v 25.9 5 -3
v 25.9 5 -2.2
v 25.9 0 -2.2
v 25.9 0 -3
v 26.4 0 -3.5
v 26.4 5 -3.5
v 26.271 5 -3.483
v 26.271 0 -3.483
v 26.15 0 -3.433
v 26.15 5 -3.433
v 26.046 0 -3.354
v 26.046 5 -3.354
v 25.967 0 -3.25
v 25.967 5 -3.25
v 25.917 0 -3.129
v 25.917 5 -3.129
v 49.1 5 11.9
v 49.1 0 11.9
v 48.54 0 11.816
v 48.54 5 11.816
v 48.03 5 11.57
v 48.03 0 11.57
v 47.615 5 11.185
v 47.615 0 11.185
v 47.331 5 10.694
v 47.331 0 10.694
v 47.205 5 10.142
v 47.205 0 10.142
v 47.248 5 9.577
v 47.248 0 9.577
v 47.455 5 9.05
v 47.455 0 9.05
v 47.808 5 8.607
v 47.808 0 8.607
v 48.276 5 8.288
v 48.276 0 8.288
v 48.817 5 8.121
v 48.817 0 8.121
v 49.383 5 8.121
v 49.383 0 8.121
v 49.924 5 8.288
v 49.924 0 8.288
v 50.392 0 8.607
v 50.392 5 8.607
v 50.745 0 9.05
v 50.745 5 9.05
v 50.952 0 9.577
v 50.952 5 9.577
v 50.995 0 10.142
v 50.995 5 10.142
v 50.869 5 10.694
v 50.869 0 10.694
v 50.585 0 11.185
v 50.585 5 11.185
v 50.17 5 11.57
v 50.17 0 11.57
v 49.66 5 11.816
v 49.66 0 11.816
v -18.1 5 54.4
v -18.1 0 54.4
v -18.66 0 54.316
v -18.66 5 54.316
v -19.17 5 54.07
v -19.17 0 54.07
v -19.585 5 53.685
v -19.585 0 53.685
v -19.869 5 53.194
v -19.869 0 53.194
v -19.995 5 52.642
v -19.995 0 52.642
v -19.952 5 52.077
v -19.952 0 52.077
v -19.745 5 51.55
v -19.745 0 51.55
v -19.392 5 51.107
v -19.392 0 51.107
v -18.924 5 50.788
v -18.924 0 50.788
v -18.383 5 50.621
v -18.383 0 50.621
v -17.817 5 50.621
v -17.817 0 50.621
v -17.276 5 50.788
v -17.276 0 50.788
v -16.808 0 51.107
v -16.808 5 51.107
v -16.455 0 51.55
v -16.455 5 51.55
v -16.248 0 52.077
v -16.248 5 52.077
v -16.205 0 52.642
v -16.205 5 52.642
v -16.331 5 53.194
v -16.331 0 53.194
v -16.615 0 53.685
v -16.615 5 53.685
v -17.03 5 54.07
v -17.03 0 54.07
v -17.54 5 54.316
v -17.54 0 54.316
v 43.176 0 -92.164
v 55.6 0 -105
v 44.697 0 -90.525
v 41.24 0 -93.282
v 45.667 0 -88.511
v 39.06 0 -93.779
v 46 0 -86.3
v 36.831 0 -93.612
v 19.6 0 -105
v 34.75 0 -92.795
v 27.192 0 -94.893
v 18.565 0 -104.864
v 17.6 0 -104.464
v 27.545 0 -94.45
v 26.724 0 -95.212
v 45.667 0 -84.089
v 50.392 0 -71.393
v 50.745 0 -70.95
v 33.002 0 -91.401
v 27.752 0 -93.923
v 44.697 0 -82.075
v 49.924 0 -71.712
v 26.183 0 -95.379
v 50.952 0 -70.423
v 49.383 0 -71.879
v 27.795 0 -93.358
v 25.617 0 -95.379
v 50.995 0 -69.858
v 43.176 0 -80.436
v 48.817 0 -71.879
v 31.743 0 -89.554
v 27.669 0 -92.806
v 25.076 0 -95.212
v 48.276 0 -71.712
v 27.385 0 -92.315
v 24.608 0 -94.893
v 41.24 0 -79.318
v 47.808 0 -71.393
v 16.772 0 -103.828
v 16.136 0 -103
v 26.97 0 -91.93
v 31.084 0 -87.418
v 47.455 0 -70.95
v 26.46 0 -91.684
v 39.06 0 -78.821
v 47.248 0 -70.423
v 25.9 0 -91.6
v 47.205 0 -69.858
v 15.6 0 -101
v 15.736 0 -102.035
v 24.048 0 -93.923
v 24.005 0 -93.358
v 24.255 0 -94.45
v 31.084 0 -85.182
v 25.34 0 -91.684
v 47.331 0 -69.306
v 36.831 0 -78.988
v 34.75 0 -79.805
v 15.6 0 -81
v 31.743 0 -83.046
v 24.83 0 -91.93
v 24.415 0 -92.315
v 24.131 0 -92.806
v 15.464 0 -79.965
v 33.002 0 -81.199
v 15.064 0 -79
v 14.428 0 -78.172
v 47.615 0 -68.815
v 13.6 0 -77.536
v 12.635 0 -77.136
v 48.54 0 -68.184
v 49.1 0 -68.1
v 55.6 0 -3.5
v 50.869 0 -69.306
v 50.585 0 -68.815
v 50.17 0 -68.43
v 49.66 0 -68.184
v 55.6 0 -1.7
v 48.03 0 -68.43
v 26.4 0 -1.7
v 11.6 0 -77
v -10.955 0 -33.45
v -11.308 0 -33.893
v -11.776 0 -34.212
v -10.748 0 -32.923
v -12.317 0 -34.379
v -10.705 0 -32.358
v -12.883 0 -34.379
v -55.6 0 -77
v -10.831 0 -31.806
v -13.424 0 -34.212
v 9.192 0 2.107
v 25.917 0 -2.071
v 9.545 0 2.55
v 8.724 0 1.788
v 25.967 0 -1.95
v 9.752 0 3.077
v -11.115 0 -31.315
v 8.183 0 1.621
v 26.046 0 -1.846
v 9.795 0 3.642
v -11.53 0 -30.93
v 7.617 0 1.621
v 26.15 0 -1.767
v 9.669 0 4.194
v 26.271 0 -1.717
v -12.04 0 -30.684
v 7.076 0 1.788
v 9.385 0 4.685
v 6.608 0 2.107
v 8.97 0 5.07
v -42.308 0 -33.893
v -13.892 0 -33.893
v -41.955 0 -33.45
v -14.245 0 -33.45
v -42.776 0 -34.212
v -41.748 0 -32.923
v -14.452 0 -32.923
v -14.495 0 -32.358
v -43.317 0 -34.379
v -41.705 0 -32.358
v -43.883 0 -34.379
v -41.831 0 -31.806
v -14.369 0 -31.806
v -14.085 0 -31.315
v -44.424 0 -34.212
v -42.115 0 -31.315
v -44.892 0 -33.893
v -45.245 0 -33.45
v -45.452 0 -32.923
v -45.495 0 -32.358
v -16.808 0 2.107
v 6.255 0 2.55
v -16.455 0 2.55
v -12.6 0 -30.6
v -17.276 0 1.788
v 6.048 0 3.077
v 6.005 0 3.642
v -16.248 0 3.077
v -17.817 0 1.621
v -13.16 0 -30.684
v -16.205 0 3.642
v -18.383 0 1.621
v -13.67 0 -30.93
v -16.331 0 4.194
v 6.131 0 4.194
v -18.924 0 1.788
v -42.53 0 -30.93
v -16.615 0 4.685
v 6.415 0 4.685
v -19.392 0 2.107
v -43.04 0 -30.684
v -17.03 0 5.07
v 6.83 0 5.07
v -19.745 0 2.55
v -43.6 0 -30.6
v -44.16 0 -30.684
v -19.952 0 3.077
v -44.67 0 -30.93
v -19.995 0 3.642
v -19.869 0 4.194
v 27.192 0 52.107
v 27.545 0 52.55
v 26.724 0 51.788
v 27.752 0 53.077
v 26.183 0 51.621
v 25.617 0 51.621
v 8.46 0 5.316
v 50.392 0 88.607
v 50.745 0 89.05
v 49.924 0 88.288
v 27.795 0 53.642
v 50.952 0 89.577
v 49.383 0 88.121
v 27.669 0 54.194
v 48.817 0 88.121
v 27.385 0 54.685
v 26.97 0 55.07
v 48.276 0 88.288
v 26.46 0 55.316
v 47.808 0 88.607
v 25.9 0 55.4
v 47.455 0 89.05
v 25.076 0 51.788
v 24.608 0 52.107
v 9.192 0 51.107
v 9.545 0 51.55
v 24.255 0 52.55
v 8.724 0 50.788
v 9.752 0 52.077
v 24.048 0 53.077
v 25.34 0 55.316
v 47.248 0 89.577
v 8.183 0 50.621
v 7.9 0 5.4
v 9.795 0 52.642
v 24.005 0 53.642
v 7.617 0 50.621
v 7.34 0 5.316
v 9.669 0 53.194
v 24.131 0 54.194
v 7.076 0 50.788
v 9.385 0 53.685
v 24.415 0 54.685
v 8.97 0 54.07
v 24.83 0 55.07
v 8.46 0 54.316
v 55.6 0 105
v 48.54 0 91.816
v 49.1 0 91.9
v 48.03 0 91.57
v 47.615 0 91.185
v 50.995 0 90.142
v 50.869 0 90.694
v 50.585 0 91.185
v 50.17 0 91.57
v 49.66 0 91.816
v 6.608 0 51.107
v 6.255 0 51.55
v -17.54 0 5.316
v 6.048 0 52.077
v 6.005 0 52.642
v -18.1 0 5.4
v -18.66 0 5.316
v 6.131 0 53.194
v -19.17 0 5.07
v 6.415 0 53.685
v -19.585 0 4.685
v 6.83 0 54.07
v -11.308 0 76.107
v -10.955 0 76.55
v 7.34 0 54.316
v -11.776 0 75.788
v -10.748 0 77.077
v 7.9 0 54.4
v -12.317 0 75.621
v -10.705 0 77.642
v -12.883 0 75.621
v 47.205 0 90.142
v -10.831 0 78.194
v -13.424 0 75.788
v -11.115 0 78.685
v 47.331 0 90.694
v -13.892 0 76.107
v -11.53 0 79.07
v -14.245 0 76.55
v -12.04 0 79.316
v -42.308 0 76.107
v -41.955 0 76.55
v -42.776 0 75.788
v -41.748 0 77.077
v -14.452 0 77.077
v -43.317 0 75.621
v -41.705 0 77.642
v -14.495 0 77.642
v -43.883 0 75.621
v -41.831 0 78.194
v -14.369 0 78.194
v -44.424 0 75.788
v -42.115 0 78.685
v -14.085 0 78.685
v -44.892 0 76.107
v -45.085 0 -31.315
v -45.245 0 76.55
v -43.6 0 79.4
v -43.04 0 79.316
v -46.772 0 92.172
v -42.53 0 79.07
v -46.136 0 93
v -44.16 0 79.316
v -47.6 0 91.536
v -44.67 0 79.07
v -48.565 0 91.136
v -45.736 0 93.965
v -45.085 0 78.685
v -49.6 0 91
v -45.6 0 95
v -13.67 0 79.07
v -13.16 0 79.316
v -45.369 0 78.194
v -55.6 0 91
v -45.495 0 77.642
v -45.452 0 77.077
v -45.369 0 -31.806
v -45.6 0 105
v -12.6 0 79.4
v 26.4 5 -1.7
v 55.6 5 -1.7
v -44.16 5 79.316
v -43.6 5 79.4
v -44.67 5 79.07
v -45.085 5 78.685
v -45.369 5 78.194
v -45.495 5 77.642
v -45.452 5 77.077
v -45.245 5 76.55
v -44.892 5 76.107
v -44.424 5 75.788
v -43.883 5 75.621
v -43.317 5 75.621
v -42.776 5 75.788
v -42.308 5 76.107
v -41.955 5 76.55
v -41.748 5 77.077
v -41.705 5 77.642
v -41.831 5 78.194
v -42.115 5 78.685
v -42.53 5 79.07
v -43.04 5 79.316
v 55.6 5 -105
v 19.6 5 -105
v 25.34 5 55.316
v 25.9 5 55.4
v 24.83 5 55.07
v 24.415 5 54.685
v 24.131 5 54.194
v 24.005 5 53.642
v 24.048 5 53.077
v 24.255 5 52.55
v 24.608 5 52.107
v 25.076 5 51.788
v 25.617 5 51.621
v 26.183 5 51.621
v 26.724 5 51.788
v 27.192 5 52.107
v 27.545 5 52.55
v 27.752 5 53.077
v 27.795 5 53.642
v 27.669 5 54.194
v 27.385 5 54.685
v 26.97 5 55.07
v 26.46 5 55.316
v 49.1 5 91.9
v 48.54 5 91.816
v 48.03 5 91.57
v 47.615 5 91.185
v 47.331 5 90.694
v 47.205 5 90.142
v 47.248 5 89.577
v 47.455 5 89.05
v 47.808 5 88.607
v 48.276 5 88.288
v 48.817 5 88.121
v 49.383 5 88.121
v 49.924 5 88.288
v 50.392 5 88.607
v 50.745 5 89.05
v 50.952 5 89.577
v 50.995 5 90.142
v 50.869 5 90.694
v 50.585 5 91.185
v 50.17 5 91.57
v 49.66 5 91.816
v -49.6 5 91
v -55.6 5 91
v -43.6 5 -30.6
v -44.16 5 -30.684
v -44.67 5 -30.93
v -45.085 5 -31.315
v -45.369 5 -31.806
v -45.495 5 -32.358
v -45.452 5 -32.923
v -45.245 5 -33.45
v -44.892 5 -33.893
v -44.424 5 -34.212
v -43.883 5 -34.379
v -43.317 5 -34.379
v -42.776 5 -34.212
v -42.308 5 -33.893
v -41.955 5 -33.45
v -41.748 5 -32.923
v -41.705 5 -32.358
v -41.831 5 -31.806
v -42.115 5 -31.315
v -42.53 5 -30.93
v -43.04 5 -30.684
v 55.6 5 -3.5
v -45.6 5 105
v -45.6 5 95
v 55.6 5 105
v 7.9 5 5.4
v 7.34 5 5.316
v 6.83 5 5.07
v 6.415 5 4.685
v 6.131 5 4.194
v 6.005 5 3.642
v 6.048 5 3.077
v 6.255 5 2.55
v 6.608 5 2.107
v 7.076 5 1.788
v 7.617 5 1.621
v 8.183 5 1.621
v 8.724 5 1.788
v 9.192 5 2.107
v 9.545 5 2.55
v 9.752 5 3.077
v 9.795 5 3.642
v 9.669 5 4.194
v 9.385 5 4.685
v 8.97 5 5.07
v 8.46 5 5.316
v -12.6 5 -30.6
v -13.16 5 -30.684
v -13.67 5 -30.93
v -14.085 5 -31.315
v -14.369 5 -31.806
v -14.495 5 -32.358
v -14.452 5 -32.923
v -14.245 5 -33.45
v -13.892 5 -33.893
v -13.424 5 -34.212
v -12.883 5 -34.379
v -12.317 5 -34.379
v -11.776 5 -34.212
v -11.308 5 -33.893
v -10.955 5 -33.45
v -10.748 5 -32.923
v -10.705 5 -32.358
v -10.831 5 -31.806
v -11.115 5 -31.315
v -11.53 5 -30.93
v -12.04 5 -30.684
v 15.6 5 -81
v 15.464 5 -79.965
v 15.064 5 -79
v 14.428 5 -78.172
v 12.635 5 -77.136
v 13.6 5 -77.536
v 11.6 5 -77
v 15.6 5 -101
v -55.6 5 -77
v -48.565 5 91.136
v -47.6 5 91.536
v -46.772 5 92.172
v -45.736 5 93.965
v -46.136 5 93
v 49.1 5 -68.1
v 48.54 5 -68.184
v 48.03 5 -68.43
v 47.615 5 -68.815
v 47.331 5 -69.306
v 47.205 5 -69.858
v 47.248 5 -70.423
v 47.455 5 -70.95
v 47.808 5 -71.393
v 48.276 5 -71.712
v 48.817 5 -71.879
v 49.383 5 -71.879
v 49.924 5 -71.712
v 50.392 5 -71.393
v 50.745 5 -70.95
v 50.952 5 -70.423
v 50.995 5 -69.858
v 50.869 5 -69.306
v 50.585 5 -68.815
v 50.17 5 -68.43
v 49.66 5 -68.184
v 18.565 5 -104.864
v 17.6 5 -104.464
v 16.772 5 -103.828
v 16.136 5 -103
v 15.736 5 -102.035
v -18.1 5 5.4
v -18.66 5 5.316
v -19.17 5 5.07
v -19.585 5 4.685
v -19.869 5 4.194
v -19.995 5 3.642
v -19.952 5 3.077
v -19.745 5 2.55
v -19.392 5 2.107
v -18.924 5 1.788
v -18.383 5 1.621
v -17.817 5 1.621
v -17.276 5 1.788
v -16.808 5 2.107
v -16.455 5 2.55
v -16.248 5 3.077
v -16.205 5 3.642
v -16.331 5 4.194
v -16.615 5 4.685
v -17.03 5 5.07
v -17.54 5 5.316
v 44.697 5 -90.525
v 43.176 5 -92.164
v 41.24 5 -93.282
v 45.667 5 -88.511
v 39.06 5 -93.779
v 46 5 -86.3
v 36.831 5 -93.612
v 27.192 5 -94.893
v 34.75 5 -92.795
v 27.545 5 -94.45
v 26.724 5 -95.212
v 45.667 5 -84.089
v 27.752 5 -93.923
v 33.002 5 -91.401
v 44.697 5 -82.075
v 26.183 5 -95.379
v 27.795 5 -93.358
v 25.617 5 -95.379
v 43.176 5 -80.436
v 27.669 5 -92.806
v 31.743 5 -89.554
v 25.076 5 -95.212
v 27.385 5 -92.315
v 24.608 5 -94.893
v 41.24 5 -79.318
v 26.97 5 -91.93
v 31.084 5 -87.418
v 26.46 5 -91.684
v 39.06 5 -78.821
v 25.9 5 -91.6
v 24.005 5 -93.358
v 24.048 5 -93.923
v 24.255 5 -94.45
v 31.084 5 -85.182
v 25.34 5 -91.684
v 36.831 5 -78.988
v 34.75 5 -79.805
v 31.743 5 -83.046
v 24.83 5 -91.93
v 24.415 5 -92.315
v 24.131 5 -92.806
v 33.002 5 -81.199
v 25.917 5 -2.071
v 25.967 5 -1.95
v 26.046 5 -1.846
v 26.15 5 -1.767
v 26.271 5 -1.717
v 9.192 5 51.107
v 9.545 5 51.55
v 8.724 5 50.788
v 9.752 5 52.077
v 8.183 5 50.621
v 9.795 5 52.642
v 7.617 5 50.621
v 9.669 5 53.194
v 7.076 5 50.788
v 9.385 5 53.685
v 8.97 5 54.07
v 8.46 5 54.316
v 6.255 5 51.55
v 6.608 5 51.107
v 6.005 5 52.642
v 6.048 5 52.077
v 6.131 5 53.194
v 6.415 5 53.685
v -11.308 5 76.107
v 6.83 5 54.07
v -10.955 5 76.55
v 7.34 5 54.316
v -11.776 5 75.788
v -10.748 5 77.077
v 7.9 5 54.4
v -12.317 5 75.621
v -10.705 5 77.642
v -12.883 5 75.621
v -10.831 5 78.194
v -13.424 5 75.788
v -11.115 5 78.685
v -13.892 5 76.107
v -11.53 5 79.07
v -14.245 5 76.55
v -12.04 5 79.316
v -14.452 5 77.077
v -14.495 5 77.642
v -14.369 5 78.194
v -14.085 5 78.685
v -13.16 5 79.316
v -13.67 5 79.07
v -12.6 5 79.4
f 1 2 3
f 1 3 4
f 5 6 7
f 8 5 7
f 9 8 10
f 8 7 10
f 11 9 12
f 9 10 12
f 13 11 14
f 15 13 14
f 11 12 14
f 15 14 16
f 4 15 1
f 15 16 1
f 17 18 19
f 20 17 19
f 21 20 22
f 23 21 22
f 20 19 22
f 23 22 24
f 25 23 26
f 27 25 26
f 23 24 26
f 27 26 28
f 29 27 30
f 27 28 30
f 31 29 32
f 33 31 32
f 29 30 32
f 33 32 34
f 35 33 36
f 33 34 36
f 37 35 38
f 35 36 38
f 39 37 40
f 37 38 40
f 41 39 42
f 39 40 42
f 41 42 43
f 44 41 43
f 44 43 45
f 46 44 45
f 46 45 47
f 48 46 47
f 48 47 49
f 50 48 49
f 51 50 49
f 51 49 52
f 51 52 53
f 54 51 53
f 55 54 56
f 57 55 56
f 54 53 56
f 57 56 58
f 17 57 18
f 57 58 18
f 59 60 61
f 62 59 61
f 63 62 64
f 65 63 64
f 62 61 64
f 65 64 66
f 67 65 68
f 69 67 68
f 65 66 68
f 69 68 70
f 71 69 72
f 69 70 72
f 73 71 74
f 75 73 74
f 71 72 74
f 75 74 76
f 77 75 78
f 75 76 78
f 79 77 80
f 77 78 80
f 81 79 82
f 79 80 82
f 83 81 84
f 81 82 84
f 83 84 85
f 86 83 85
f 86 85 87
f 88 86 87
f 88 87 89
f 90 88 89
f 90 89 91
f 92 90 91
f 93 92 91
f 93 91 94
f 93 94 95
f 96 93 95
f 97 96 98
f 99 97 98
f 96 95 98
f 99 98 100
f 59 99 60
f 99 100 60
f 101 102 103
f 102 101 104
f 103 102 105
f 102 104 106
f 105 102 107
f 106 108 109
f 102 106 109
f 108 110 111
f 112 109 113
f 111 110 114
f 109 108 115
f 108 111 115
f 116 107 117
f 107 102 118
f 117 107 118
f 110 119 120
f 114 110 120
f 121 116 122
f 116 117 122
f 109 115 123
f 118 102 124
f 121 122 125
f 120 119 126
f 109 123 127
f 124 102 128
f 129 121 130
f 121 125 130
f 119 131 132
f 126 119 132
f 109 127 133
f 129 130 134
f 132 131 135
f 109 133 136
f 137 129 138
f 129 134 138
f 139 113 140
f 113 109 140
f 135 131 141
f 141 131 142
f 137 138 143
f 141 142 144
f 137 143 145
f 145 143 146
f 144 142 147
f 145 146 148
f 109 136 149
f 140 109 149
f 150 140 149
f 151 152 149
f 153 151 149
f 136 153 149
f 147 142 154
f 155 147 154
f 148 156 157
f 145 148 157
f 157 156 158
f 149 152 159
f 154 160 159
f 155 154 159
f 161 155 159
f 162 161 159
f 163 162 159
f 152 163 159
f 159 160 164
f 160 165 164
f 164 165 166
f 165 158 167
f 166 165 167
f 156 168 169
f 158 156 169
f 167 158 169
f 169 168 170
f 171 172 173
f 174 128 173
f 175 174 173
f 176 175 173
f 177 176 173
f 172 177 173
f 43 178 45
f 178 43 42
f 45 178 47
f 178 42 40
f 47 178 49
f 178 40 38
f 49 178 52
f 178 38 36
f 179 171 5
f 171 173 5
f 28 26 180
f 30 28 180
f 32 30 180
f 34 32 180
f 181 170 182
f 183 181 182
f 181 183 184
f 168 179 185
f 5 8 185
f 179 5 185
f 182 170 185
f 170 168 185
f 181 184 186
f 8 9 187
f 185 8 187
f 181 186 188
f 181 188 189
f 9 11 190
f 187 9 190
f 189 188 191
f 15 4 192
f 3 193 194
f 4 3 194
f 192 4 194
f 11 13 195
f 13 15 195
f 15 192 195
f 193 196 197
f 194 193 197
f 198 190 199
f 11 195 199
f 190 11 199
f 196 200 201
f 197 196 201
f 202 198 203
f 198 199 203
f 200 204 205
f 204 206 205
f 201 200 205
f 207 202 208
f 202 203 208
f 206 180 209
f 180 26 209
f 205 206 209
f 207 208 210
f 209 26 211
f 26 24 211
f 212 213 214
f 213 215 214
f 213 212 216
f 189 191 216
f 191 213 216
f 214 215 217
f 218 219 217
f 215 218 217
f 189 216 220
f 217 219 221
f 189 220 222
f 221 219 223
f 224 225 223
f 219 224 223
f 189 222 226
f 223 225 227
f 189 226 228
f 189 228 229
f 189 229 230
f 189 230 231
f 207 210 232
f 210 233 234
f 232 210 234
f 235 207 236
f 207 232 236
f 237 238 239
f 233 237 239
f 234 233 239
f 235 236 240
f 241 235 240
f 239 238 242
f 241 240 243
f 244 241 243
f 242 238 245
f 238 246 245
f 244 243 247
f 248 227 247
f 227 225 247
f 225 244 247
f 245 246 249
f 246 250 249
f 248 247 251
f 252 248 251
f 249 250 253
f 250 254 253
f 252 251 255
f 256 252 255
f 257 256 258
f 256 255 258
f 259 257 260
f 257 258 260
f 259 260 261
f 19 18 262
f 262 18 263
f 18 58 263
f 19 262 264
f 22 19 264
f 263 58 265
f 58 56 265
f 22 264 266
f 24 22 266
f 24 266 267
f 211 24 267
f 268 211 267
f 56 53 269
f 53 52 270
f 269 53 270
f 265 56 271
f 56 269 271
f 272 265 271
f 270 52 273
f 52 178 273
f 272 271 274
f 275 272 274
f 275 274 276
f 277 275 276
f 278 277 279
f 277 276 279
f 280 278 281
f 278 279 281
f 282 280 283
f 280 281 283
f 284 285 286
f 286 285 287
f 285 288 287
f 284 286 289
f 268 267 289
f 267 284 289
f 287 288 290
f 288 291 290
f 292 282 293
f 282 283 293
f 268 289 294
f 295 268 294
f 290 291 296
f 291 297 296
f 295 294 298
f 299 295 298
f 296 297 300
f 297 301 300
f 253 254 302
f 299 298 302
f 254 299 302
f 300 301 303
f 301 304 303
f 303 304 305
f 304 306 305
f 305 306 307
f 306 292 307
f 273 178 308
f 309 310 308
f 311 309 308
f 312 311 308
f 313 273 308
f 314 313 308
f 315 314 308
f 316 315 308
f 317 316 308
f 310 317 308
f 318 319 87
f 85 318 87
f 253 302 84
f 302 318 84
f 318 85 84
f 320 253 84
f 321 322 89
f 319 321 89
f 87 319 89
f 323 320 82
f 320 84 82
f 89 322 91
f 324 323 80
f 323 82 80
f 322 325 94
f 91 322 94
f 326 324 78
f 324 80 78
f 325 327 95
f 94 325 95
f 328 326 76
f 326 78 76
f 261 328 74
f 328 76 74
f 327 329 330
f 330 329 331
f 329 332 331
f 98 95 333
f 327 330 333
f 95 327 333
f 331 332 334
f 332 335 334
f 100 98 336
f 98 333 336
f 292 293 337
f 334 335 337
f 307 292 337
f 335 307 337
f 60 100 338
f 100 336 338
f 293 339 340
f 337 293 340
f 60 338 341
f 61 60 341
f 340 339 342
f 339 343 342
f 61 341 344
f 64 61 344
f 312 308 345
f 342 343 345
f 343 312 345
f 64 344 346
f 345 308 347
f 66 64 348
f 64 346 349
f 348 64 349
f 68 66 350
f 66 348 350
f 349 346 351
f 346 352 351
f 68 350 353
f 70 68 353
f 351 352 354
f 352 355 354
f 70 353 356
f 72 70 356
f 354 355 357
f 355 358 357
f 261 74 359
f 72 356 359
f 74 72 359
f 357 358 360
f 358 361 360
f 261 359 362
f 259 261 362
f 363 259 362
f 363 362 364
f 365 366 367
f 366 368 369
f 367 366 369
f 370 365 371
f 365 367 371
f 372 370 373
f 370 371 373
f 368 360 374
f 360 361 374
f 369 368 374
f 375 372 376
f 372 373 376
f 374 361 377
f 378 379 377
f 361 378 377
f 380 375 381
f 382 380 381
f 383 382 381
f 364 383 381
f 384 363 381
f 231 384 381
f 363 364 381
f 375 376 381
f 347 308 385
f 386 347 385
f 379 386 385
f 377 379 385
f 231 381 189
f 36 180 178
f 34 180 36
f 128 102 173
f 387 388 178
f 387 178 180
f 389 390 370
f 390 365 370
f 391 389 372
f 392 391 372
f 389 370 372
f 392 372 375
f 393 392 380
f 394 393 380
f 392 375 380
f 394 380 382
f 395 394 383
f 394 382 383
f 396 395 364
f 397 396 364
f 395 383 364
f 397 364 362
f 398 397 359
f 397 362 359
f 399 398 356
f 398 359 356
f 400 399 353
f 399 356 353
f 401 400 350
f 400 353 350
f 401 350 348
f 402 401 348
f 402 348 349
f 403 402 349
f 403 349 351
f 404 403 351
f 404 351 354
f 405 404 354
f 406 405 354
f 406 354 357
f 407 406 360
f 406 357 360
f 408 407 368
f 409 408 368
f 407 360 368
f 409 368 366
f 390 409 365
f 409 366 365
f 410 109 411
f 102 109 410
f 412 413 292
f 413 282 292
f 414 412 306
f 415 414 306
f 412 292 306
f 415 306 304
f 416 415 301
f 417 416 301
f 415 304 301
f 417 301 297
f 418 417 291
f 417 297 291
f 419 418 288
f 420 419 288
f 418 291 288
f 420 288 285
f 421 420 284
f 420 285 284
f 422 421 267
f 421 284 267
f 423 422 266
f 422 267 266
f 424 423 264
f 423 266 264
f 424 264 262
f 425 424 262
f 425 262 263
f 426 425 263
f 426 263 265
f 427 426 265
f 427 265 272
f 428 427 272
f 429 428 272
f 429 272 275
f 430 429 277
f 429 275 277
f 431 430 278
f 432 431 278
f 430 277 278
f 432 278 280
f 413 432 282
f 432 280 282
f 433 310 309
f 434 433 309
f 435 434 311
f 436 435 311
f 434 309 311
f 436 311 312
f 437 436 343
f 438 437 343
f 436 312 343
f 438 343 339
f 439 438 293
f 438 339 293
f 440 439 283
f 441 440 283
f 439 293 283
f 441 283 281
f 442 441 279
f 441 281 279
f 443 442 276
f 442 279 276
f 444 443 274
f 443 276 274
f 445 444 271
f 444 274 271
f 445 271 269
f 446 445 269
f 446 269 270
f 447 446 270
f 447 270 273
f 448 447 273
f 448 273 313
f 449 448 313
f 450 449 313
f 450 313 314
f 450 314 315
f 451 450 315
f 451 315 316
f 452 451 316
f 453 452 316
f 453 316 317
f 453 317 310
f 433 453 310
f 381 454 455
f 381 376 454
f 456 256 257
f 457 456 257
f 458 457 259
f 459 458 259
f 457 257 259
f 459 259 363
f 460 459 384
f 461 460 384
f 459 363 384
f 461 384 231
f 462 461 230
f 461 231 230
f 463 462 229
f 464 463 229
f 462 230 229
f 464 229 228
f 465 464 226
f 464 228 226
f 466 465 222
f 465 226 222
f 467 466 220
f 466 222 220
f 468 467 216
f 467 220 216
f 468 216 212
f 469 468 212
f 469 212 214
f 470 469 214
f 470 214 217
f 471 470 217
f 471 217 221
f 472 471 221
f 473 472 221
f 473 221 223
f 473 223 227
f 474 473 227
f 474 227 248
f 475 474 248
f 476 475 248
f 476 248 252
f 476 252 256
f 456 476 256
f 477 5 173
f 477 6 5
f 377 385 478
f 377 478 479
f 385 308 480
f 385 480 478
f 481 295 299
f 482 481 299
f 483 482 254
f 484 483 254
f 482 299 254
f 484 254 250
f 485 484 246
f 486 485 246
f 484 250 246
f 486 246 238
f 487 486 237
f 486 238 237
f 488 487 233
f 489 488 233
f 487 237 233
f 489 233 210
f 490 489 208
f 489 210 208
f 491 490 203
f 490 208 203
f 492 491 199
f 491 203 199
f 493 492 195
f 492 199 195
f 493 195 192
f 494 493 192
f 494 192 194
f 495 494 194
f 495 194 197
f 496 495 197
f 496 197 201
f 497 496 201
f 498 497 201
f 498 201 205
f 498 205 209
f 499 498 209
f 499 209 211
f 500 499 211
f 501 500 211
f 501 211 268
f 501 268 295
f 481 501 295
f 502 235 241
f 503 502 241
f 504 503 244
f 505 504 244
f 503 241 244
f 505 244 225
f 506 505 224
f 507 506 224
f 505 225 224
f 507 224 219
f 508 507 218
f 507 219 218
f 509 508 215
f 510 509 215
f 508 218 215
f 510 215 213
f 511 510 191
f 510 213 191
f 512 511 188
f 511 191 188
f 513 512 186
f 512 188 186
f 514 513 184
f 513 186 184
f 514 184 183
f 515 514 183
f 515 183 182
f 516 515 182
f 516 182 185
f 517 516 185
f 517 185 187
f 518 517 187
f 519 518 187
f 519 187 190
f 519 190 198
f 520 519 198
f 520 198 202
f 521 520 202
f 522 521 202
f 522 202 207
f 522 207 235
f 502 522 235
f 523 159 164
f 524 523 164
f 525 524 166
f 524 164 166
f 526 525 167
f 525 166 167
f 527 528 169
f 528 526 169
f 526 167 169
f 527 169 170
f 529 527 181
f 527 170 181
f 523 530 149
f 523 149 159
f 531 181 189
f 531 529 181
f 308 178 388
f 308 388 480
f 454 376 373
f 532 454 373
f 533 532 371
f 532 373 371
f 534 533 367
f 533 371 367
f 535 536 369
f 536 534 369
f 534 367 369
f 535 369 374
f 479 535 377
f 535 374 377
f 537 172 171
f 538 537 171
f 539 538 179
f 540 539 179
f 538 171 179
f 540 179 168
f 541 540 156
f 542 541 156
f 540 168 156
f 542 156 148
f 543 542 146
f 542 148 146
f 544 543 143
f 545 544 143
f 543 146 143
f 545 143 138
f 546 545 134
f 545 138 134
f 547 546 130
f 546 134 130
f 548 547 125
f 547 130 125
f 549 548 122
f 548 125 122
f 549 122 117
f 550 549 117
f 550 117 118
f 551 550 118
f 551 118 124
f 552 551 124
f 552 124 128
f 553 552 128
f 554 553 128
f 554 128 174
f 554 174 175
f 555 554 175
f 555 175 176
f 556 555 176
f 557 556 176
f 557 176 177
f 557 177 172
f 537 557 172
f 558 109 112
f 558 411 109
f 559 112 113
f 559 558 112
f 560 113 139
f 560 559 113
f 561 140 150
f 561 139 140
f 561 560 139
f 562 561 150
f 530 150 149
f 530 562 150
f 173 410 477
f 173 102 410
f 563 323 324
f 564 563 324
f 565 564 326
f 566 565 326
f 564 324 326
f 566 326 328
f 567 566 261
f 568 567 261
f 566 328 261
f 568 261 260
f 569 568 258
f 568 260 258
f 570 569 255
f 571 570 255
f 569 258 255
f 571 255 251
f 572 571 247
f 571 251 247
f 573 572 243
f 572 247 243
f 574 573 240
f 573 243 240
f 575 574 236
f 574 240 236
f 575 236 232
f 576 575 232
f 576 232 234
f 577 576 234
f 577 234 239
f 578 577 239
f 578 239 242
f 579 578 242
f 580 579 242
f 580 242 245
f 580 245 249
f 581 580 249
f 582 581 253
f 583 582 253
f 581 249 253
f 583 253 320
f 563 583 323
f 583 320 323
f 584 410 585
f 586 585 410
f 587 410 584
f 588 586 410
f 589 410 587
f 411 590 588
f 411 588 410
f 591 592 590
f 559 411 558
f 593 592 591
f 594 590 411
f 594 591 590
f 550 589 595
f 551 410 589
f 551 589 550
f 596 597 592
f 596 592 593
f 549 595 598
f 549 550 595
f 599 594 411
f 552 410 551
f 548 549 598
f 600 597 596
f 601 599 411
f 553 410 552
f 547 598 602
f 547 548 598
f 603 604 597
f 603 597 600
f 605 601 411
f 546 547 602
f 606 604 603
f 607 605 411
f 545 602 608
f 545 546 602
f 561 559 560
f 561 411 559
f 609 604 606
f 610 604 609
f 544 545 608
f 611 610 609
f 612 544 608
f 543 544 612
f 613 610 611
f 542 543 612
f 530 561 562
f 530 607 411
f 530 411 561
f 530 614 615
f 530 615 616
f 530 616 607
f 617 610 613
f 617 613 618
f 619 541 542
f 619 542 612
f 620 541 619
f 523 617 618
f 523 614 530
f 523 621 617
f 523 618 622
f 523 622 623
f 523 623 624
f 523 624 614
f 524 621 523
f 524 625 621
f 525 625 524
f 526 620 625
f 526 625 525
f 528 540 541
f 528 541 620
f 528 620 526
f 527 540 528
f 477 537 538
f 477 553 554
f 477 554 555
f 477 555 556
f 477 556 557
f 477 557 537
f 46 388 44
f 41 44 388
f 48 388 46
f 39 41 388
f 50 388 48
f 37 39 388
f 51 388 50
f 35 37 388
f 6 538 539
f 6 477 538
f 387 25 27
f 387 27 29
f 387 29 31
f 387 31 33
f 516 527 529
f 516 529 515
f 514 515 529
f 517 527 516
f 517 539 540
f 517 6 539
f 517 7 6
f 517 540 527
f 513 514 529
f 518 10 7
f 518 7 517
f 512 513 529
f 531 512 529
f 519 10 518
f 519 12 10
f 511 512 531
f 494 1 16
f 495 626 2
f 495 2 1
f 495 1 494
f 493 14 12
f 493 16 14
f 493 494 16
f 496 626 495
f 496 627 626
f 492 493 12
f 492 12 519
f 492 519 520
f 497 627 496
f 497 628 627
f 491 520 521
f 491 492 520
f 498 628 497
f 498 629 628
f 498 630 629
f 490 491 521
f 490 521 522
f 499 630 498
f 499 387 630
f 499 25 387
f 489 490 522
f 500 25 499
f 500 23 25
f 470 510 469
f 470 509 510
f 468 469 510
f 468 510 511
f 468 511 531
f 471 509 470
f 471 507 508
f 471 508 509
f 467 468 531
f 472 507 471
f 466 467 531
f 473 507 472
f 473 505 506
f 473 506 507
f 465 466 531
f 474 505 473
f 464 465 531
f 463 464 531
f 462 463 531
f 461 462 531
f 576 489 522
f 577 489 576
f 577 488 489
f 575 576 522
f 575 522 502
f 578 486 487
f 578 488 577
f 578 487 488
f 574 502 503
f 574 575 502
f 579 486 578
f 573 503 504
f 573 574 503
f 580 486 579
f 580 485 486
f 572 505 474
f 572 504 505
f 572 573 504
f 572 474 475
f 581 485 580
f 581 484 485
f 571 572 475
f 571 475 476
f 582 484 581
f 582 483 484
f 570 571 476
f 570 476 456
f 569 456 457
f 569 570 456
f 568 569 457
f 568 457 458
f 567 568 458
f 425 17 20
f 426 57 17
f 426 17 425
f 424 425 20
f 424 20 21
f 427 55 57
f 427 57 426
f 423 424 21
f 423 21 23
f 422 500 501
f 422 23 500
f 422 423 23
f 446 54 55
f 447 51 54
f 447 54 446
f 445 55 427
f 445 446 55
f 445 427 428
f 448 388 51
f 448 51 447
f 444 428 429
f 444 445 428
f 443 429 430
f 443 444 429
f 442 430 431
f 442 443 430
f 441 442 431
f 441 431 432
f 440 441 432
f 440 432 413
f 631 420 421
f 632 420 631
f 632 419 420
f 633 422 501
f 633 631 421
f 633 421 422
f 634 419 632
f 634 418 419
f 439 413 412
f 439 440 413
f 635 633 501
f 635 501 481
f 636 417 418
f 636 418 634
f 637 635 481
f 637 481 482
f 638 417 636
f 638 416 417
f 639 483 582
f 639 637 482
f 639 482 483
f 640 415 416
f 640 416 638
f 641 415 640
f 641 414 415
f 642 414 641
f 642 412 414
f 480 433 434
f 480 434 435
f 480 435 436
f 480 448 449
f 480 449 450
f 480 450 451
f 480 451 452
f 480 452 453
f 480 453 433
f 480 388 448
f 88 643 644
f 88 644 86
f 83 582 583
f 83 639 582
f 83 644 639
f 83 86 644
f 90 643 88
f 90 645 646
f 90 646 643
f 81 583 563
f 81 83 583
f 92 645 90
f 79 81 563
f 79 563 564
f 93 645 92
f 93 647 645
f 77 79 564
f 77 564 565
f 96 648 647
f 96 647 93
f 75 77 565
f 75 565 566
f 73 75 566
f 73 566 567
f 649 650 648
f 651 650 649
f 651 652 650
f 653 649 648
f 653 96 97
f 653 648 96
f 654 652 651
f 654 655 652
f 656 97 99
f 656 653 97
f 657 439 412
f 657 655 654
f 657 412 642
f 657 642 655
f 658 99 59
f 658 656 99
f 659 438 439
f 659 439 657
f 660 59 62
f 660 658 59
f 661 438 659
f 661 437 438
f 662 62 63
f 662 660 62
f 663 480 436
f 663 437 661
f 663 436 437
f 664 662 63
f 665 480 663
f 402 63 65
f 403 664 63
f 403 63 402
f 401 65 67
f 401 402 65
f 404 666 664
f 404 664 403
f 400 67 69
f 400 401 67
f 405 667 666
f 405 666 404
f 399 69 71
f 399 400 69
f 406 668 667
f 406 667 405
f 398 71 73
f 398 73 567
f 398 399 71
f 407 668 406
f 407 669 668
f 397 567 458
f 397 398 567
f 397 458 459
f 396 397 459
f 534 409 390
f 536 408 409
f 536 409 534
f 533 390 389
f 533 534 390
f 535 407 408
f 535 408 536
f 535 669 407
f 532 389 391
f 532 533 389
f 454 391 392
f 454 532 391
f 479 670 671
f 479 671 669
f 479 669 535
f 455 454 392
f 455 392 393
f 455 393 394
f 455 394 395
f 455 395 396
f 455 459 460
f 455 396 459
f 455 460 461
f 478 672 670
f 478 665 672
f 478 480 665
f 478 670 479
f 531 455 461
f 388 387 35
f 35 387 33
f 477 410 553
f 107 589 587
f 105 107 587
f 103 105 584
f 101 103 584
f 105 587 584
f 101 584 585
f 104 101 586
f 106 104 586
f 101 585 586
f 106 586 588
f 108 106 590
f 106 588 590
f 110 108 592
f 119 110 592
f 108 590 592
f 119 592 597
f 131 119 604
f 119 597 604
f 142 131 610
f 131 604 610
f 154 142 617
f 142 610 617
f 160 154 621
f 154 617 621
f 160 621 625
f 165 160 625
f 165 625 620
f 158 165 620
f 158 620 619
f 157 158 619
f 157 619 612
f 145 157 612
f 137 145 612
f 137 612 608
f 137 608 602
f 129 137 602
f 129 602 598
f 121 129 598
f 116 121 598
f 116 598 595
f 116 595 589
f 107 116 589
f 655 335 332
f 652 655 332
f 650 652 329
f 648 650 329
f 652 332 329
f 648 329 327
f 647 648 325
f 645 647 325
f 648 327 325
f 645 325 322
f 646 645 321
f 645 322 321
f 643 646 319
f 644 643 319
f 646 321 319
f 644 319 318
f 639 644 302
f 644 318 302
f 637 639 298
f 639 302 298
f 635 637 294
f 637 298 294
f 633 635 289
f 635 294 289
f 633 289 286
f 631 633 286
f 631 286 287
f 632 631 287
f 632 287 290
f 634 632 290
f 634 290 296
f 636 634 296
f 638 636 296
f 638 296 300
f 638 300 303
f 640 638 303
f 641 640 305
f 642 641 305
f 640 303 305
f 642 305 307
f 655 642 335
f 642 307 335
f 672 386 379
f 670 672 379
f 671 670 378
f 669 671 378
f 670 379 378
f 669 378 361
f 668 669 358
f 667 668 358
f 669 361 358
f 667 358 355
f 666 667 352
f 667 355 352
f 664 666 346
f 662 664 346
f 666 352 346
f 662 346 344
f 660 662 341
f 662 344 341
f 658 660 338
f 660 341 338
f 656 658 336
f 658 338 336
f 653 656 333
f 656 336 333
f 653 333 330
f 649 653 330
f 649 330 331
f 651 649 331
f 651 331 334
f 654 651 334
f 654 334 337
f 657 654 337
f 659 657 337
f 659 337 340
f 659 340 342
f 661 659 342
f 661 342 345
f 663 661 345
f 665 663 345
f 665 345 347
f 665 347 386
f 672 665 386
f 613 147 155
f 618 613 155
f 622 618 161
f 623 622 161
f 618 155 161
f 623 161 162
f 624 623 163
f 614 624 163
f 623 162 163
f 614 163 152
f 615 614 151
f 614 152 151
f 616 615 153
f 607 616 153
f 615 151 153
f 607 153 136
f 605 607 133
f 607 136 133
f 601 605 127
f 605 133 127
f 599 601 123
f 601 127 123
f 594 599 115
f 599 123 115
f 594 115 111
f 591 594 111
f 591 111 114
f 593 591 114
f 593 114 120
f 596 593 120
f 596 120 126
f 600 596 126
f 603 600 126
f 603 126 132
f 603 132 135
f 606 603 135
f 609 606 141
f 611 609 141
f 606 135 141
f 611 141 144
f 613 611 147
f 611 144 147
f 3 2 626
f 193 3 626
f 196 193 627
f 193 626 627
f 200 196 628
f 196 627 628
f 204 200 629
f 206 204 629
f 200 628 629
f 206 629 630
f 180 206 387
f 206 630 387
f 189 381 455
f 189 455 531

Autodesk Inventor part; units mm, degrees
ref_plane "YZ Plane" through (0, 0, 0) normal (1, 0, 0) x (0, 1, 0)
ref_plane "XZ Plane" through (0, 0, 0) normal (0, 1, 0) x (-1, 0, 0)
ref_plane "XY Plane" through (0, 0, 0) normal (0, 0, 1) x (1, 0, 0)
sketch "Sketch1" plane through (0, 0, 0) normal (0, 1, 0) x (-1, 0, 0)
  line L0 (-55.6, 105) -> (55.6, 105)
  line L1 (55.6, 105) -> (55.6, -105)
  line L2 (55.6, -105) -> (-55.6, -105)
  line L3 (-55.6, -105) -> (-55.6, 105)
  line L4 (-55.6, 105) -> (55.6, -105) construction
  line L5 (55.6, 105) -> (-55.6, -105) construction
  line L6 (55.6, -105) -> (-15.6, -105)
  line L7 (-15.6, -105) -> (-15.6, -95)
  line L8 (-15.6, -95) -> (55.6, -95)
  line L9 (55.6, -95) -> (55.6, -105)
  line L10 (55.6, 105) -> (45.6, 105)
  line L11 (45.6, 105) -> (45.6, 95)
  line L12 (49.6, 91) -> (55.6, 91)
  line L13 (55.6, 91) -> (55.6, 105)
  arc A0 (45.6, 95) -> (49.6, 91) centre (49.6, 95) ccw
  point P0 (0, 0)
  point P1 (-15.6, -105)
  point P2 (55.6, -95)
  point P3 (55.6, 91)
  dimension "d0" = 111.2
  dimension "d1" = 210
  dimension "d84" = 10
  dimension "d85" = 40
  dimension "d86" = 14
  dimension "d87" = 10
  dimension "d88" = 4
extrude "Extrusion1" add sketch "Sketch1" along normal blind 5 contours L0 L11 A0 L12 L1 L8 L7 L2 L3
sketch "Sketch2" plane through (0, 5, 0) normal (0, 1, 0) x (1, 0, 0)
  line L0 (36, 32.5) -> (-43.6, 32.5) construction
  line L1 (-43.6, -77.5) -> (36, -77.5) construction
  line L2 (-55.6, 95) -> (-55.6, -91) construction
  line L3 (-45.6, -105) -> (55.6, -105) projected
  point P0 (0, 0)
  point P1 (-12.6, -77.5)
  point P2 (-12.6, 32.5)
  dimension "d6" = 31
  dimension "d7" = 31
  dimension "d17" = 12
  dimension "d18" = 12
  dimension "d89" = 110
  dimension "d90" = 27.5
hole "Hole1" at (-43.6, 5, 77.5) at (-43.6, 5, -32.5) at (-12.6, 5, 77.5) at (-12.6, 5, -32.5) direction (0, -1, 0) diameter 3.8 end through all
sketch "Sketch6" plane through (0, 5, 0) normal (0, 1, 0) x (1, 0, 0)
  line L0 (25.9, 93.5) -> (-42.1, 93.5)
  line L1 (-42.1, 93.5) -> (-42.1, -53.5)
  line L2 (-42.1, -53.5) -> (25.9, -53.5)
  line L3 (25.9, -53.5) -> (25.9, 93.5)
  line L4 (25.9, 93.5) -> (-42.1, -53.5) construction
  line L5 (-42.1, 93.5) -> (25.9, -53.5) construction
  line L6 (55.6, -105) -> (55.6, 105) projected
  line L7 (-45.6, -105) -> (55.6, -105) projected
  line L8 (55.6, 105) -> (15.6, 105) projected
  point P0 (0, 0)
  point P1 (-8.1, 20)
  dimension "d29" = 68
  dimension "d30" = 147
  dimension "d32" = 29.7
  dimension "d91" = 51.5
  dimension "d92" = 11.5
hole "Hole2" at (25.9, 5, -93.5) at (25.9, 5, 53.5) direction (0, -1, 0) diameter 3.8 end through all
sketch "Sketch14" plane through (0, 5, 0) normal (0, 1, 0) x (1, 0, 0)
  line L0 (49.1, 119.5954) -> (49.1, -116.5639) construction
  line L1 (55.6, -105) -> (55.6, 105) construction
  line L2 (-45.6, -105) -> (55.6, -105) construction
  point P0 (0, 0)
  point P1 (49.1, 70)
  point P2 (49.1, -10)
  point P3 (49.1, -90)
  dimension "d93" = 6.5
  dimension "d94" = 15
  dimension "d95" = 80
  dimension "d96" = 80
hole "Hole5" at (49.1, 5, -70) at (49.1, 5, 10) at (49.1, 5, 90) direction (0, -1, 0) diameter 3.8 end through all
sketch "Sketch13" plane through (0, 5, 0) normal (0, 1, 0) x (1, 0, 0)
  line L0 (25.9, 3) -> (25.9, -107.0389) construction
  circle A0 centre (25.9, 93.5) radius 1.9 construction
  circle A1 centre (25.9, -53.5) radius 1.9 construction
  circle A2 centre (-12.6, -77.5) radius 1.9 construction
  circle A3 centre (-43.6, -77.5) radius 1.9 construction
  circle A4 centre (-43.6, 32.5) radius 1.9 construction
  circle A5 centre (-12.6, 32.5) radius 1.9 construction
  line L1 (-55.6, 95) -> (-55.6, -91) construction
  line L2 (55.6, 1.7) -> (26.4, 1.7)
  line L3 (25.9, 2.2) -> (25.9, 3.5)
  line L4 (26.4, 3.5) -> (55.6, 3.5)
  line L5 (55.6, 3.5) -> (55.6, 1.7)
  arc A6 (26.4, 3.5) -> (25.9, 3) centre (26.4, 3) ccw
  arc A7 (25.9, 2.2) -> (26.4, 1.7) centre (26.4, 2.2) ccw
  line L6 (55.6, 105) -> (15.6, 105) projected
  line L7 (15.6, 105) -> (15.6, 95) projected
  line L8 (15.6, 95) -> (-55.6, 95) projected
  line L9 (-55.6, -91) -> (-49.6, -91) projected
  arc A8 (-45.6, -95) -> (-49.6, -91) centre (-49.6, -95) ccw projected
  line L10 (-45.6, -95) -> (-45.6, -105) projected
  line L11 (-45.6, -105) -> (55.6, -105) projected
  line L12 (55.6, -105) -> (55.6, 105) projected
  point P0 (0, 0)
  point P1 (25.9, 3)
  dimension "d75" = 1.8
  dimension "d76" = 0.5
  dimension "d77" = 90
  dimension "d78" = 57
extrude "Extrusion9" cut sketch "Sketch13" against normal through all
sketch "Sketch15" plane through (0, 5, 0) normal (0, 1, 0) x (1, 0, 0)
  line L0 (-18.1, -3.5) -> (7.9, -3.5) construction
  line L1 (7.9, -3.5) -> (7.9, -52.5) construction
  line L2 (7.9, -52.5) -> (-18.1, -52.5) construction
  line L3 (-18.1, -52.5) -> (-18.1, -3.5) construction
  circle A0 centre (-12.6, -77.5) radius 1.9 construction
  circle A1 centre (25.9, -53.5) radius 1.9 construction
  point P0 (0, 0)
  dimension "d104" = 26
  dimension "d105" = 49
  dimension "d106" = 25
  dimension "d107" = 18
hole "Hole6" at (-18.1, 5, 3.5) at (7.9, 5, 3.5) at (7.9, 5, 52.5) at (-18.1, 5, 52.5) direction (0, -1, 0) diameter 3.8 end through all
sketch "Sketch16" plane through (0, 5, 0) normal (0, 1, 0) x (1, 0, 0)
  line L0 (-55.6, 95) -> (-55.6, -91) projected
  line L1 (-55.6, 95) -> (15.6, 95)
  line L2 (15.6, 95) -> (15.6, 77)
  line L3 (15.6, 77) -> (-55.6, 77)
  line L4 (-55.6, 77) -> (-55.6, 95)
  line L5 (15.6, 105) -> (15.6, 95) projected
  circle A0 centre (38.5, 86.3) radius 7.5
  line L6 (55.6, 105) -> (15.6, 105) projected
  line L7 (55.6, 3.5) -> (55.6, 105) projected
  point P0 (0, 0)
  dimension "d115" = 18
  dimension "d116" = 15
  dimension "d117" = 18.7
  dimension "d118" = 17.1
extrude "Extrusion10" cut sketch "Sketch16" against normal through all
fillet "Fillet1" radius 4 2 edges at (15.6, 2.5, -77) (15.6, 2.5, -105)
properties part number "Inner Top Plate"
